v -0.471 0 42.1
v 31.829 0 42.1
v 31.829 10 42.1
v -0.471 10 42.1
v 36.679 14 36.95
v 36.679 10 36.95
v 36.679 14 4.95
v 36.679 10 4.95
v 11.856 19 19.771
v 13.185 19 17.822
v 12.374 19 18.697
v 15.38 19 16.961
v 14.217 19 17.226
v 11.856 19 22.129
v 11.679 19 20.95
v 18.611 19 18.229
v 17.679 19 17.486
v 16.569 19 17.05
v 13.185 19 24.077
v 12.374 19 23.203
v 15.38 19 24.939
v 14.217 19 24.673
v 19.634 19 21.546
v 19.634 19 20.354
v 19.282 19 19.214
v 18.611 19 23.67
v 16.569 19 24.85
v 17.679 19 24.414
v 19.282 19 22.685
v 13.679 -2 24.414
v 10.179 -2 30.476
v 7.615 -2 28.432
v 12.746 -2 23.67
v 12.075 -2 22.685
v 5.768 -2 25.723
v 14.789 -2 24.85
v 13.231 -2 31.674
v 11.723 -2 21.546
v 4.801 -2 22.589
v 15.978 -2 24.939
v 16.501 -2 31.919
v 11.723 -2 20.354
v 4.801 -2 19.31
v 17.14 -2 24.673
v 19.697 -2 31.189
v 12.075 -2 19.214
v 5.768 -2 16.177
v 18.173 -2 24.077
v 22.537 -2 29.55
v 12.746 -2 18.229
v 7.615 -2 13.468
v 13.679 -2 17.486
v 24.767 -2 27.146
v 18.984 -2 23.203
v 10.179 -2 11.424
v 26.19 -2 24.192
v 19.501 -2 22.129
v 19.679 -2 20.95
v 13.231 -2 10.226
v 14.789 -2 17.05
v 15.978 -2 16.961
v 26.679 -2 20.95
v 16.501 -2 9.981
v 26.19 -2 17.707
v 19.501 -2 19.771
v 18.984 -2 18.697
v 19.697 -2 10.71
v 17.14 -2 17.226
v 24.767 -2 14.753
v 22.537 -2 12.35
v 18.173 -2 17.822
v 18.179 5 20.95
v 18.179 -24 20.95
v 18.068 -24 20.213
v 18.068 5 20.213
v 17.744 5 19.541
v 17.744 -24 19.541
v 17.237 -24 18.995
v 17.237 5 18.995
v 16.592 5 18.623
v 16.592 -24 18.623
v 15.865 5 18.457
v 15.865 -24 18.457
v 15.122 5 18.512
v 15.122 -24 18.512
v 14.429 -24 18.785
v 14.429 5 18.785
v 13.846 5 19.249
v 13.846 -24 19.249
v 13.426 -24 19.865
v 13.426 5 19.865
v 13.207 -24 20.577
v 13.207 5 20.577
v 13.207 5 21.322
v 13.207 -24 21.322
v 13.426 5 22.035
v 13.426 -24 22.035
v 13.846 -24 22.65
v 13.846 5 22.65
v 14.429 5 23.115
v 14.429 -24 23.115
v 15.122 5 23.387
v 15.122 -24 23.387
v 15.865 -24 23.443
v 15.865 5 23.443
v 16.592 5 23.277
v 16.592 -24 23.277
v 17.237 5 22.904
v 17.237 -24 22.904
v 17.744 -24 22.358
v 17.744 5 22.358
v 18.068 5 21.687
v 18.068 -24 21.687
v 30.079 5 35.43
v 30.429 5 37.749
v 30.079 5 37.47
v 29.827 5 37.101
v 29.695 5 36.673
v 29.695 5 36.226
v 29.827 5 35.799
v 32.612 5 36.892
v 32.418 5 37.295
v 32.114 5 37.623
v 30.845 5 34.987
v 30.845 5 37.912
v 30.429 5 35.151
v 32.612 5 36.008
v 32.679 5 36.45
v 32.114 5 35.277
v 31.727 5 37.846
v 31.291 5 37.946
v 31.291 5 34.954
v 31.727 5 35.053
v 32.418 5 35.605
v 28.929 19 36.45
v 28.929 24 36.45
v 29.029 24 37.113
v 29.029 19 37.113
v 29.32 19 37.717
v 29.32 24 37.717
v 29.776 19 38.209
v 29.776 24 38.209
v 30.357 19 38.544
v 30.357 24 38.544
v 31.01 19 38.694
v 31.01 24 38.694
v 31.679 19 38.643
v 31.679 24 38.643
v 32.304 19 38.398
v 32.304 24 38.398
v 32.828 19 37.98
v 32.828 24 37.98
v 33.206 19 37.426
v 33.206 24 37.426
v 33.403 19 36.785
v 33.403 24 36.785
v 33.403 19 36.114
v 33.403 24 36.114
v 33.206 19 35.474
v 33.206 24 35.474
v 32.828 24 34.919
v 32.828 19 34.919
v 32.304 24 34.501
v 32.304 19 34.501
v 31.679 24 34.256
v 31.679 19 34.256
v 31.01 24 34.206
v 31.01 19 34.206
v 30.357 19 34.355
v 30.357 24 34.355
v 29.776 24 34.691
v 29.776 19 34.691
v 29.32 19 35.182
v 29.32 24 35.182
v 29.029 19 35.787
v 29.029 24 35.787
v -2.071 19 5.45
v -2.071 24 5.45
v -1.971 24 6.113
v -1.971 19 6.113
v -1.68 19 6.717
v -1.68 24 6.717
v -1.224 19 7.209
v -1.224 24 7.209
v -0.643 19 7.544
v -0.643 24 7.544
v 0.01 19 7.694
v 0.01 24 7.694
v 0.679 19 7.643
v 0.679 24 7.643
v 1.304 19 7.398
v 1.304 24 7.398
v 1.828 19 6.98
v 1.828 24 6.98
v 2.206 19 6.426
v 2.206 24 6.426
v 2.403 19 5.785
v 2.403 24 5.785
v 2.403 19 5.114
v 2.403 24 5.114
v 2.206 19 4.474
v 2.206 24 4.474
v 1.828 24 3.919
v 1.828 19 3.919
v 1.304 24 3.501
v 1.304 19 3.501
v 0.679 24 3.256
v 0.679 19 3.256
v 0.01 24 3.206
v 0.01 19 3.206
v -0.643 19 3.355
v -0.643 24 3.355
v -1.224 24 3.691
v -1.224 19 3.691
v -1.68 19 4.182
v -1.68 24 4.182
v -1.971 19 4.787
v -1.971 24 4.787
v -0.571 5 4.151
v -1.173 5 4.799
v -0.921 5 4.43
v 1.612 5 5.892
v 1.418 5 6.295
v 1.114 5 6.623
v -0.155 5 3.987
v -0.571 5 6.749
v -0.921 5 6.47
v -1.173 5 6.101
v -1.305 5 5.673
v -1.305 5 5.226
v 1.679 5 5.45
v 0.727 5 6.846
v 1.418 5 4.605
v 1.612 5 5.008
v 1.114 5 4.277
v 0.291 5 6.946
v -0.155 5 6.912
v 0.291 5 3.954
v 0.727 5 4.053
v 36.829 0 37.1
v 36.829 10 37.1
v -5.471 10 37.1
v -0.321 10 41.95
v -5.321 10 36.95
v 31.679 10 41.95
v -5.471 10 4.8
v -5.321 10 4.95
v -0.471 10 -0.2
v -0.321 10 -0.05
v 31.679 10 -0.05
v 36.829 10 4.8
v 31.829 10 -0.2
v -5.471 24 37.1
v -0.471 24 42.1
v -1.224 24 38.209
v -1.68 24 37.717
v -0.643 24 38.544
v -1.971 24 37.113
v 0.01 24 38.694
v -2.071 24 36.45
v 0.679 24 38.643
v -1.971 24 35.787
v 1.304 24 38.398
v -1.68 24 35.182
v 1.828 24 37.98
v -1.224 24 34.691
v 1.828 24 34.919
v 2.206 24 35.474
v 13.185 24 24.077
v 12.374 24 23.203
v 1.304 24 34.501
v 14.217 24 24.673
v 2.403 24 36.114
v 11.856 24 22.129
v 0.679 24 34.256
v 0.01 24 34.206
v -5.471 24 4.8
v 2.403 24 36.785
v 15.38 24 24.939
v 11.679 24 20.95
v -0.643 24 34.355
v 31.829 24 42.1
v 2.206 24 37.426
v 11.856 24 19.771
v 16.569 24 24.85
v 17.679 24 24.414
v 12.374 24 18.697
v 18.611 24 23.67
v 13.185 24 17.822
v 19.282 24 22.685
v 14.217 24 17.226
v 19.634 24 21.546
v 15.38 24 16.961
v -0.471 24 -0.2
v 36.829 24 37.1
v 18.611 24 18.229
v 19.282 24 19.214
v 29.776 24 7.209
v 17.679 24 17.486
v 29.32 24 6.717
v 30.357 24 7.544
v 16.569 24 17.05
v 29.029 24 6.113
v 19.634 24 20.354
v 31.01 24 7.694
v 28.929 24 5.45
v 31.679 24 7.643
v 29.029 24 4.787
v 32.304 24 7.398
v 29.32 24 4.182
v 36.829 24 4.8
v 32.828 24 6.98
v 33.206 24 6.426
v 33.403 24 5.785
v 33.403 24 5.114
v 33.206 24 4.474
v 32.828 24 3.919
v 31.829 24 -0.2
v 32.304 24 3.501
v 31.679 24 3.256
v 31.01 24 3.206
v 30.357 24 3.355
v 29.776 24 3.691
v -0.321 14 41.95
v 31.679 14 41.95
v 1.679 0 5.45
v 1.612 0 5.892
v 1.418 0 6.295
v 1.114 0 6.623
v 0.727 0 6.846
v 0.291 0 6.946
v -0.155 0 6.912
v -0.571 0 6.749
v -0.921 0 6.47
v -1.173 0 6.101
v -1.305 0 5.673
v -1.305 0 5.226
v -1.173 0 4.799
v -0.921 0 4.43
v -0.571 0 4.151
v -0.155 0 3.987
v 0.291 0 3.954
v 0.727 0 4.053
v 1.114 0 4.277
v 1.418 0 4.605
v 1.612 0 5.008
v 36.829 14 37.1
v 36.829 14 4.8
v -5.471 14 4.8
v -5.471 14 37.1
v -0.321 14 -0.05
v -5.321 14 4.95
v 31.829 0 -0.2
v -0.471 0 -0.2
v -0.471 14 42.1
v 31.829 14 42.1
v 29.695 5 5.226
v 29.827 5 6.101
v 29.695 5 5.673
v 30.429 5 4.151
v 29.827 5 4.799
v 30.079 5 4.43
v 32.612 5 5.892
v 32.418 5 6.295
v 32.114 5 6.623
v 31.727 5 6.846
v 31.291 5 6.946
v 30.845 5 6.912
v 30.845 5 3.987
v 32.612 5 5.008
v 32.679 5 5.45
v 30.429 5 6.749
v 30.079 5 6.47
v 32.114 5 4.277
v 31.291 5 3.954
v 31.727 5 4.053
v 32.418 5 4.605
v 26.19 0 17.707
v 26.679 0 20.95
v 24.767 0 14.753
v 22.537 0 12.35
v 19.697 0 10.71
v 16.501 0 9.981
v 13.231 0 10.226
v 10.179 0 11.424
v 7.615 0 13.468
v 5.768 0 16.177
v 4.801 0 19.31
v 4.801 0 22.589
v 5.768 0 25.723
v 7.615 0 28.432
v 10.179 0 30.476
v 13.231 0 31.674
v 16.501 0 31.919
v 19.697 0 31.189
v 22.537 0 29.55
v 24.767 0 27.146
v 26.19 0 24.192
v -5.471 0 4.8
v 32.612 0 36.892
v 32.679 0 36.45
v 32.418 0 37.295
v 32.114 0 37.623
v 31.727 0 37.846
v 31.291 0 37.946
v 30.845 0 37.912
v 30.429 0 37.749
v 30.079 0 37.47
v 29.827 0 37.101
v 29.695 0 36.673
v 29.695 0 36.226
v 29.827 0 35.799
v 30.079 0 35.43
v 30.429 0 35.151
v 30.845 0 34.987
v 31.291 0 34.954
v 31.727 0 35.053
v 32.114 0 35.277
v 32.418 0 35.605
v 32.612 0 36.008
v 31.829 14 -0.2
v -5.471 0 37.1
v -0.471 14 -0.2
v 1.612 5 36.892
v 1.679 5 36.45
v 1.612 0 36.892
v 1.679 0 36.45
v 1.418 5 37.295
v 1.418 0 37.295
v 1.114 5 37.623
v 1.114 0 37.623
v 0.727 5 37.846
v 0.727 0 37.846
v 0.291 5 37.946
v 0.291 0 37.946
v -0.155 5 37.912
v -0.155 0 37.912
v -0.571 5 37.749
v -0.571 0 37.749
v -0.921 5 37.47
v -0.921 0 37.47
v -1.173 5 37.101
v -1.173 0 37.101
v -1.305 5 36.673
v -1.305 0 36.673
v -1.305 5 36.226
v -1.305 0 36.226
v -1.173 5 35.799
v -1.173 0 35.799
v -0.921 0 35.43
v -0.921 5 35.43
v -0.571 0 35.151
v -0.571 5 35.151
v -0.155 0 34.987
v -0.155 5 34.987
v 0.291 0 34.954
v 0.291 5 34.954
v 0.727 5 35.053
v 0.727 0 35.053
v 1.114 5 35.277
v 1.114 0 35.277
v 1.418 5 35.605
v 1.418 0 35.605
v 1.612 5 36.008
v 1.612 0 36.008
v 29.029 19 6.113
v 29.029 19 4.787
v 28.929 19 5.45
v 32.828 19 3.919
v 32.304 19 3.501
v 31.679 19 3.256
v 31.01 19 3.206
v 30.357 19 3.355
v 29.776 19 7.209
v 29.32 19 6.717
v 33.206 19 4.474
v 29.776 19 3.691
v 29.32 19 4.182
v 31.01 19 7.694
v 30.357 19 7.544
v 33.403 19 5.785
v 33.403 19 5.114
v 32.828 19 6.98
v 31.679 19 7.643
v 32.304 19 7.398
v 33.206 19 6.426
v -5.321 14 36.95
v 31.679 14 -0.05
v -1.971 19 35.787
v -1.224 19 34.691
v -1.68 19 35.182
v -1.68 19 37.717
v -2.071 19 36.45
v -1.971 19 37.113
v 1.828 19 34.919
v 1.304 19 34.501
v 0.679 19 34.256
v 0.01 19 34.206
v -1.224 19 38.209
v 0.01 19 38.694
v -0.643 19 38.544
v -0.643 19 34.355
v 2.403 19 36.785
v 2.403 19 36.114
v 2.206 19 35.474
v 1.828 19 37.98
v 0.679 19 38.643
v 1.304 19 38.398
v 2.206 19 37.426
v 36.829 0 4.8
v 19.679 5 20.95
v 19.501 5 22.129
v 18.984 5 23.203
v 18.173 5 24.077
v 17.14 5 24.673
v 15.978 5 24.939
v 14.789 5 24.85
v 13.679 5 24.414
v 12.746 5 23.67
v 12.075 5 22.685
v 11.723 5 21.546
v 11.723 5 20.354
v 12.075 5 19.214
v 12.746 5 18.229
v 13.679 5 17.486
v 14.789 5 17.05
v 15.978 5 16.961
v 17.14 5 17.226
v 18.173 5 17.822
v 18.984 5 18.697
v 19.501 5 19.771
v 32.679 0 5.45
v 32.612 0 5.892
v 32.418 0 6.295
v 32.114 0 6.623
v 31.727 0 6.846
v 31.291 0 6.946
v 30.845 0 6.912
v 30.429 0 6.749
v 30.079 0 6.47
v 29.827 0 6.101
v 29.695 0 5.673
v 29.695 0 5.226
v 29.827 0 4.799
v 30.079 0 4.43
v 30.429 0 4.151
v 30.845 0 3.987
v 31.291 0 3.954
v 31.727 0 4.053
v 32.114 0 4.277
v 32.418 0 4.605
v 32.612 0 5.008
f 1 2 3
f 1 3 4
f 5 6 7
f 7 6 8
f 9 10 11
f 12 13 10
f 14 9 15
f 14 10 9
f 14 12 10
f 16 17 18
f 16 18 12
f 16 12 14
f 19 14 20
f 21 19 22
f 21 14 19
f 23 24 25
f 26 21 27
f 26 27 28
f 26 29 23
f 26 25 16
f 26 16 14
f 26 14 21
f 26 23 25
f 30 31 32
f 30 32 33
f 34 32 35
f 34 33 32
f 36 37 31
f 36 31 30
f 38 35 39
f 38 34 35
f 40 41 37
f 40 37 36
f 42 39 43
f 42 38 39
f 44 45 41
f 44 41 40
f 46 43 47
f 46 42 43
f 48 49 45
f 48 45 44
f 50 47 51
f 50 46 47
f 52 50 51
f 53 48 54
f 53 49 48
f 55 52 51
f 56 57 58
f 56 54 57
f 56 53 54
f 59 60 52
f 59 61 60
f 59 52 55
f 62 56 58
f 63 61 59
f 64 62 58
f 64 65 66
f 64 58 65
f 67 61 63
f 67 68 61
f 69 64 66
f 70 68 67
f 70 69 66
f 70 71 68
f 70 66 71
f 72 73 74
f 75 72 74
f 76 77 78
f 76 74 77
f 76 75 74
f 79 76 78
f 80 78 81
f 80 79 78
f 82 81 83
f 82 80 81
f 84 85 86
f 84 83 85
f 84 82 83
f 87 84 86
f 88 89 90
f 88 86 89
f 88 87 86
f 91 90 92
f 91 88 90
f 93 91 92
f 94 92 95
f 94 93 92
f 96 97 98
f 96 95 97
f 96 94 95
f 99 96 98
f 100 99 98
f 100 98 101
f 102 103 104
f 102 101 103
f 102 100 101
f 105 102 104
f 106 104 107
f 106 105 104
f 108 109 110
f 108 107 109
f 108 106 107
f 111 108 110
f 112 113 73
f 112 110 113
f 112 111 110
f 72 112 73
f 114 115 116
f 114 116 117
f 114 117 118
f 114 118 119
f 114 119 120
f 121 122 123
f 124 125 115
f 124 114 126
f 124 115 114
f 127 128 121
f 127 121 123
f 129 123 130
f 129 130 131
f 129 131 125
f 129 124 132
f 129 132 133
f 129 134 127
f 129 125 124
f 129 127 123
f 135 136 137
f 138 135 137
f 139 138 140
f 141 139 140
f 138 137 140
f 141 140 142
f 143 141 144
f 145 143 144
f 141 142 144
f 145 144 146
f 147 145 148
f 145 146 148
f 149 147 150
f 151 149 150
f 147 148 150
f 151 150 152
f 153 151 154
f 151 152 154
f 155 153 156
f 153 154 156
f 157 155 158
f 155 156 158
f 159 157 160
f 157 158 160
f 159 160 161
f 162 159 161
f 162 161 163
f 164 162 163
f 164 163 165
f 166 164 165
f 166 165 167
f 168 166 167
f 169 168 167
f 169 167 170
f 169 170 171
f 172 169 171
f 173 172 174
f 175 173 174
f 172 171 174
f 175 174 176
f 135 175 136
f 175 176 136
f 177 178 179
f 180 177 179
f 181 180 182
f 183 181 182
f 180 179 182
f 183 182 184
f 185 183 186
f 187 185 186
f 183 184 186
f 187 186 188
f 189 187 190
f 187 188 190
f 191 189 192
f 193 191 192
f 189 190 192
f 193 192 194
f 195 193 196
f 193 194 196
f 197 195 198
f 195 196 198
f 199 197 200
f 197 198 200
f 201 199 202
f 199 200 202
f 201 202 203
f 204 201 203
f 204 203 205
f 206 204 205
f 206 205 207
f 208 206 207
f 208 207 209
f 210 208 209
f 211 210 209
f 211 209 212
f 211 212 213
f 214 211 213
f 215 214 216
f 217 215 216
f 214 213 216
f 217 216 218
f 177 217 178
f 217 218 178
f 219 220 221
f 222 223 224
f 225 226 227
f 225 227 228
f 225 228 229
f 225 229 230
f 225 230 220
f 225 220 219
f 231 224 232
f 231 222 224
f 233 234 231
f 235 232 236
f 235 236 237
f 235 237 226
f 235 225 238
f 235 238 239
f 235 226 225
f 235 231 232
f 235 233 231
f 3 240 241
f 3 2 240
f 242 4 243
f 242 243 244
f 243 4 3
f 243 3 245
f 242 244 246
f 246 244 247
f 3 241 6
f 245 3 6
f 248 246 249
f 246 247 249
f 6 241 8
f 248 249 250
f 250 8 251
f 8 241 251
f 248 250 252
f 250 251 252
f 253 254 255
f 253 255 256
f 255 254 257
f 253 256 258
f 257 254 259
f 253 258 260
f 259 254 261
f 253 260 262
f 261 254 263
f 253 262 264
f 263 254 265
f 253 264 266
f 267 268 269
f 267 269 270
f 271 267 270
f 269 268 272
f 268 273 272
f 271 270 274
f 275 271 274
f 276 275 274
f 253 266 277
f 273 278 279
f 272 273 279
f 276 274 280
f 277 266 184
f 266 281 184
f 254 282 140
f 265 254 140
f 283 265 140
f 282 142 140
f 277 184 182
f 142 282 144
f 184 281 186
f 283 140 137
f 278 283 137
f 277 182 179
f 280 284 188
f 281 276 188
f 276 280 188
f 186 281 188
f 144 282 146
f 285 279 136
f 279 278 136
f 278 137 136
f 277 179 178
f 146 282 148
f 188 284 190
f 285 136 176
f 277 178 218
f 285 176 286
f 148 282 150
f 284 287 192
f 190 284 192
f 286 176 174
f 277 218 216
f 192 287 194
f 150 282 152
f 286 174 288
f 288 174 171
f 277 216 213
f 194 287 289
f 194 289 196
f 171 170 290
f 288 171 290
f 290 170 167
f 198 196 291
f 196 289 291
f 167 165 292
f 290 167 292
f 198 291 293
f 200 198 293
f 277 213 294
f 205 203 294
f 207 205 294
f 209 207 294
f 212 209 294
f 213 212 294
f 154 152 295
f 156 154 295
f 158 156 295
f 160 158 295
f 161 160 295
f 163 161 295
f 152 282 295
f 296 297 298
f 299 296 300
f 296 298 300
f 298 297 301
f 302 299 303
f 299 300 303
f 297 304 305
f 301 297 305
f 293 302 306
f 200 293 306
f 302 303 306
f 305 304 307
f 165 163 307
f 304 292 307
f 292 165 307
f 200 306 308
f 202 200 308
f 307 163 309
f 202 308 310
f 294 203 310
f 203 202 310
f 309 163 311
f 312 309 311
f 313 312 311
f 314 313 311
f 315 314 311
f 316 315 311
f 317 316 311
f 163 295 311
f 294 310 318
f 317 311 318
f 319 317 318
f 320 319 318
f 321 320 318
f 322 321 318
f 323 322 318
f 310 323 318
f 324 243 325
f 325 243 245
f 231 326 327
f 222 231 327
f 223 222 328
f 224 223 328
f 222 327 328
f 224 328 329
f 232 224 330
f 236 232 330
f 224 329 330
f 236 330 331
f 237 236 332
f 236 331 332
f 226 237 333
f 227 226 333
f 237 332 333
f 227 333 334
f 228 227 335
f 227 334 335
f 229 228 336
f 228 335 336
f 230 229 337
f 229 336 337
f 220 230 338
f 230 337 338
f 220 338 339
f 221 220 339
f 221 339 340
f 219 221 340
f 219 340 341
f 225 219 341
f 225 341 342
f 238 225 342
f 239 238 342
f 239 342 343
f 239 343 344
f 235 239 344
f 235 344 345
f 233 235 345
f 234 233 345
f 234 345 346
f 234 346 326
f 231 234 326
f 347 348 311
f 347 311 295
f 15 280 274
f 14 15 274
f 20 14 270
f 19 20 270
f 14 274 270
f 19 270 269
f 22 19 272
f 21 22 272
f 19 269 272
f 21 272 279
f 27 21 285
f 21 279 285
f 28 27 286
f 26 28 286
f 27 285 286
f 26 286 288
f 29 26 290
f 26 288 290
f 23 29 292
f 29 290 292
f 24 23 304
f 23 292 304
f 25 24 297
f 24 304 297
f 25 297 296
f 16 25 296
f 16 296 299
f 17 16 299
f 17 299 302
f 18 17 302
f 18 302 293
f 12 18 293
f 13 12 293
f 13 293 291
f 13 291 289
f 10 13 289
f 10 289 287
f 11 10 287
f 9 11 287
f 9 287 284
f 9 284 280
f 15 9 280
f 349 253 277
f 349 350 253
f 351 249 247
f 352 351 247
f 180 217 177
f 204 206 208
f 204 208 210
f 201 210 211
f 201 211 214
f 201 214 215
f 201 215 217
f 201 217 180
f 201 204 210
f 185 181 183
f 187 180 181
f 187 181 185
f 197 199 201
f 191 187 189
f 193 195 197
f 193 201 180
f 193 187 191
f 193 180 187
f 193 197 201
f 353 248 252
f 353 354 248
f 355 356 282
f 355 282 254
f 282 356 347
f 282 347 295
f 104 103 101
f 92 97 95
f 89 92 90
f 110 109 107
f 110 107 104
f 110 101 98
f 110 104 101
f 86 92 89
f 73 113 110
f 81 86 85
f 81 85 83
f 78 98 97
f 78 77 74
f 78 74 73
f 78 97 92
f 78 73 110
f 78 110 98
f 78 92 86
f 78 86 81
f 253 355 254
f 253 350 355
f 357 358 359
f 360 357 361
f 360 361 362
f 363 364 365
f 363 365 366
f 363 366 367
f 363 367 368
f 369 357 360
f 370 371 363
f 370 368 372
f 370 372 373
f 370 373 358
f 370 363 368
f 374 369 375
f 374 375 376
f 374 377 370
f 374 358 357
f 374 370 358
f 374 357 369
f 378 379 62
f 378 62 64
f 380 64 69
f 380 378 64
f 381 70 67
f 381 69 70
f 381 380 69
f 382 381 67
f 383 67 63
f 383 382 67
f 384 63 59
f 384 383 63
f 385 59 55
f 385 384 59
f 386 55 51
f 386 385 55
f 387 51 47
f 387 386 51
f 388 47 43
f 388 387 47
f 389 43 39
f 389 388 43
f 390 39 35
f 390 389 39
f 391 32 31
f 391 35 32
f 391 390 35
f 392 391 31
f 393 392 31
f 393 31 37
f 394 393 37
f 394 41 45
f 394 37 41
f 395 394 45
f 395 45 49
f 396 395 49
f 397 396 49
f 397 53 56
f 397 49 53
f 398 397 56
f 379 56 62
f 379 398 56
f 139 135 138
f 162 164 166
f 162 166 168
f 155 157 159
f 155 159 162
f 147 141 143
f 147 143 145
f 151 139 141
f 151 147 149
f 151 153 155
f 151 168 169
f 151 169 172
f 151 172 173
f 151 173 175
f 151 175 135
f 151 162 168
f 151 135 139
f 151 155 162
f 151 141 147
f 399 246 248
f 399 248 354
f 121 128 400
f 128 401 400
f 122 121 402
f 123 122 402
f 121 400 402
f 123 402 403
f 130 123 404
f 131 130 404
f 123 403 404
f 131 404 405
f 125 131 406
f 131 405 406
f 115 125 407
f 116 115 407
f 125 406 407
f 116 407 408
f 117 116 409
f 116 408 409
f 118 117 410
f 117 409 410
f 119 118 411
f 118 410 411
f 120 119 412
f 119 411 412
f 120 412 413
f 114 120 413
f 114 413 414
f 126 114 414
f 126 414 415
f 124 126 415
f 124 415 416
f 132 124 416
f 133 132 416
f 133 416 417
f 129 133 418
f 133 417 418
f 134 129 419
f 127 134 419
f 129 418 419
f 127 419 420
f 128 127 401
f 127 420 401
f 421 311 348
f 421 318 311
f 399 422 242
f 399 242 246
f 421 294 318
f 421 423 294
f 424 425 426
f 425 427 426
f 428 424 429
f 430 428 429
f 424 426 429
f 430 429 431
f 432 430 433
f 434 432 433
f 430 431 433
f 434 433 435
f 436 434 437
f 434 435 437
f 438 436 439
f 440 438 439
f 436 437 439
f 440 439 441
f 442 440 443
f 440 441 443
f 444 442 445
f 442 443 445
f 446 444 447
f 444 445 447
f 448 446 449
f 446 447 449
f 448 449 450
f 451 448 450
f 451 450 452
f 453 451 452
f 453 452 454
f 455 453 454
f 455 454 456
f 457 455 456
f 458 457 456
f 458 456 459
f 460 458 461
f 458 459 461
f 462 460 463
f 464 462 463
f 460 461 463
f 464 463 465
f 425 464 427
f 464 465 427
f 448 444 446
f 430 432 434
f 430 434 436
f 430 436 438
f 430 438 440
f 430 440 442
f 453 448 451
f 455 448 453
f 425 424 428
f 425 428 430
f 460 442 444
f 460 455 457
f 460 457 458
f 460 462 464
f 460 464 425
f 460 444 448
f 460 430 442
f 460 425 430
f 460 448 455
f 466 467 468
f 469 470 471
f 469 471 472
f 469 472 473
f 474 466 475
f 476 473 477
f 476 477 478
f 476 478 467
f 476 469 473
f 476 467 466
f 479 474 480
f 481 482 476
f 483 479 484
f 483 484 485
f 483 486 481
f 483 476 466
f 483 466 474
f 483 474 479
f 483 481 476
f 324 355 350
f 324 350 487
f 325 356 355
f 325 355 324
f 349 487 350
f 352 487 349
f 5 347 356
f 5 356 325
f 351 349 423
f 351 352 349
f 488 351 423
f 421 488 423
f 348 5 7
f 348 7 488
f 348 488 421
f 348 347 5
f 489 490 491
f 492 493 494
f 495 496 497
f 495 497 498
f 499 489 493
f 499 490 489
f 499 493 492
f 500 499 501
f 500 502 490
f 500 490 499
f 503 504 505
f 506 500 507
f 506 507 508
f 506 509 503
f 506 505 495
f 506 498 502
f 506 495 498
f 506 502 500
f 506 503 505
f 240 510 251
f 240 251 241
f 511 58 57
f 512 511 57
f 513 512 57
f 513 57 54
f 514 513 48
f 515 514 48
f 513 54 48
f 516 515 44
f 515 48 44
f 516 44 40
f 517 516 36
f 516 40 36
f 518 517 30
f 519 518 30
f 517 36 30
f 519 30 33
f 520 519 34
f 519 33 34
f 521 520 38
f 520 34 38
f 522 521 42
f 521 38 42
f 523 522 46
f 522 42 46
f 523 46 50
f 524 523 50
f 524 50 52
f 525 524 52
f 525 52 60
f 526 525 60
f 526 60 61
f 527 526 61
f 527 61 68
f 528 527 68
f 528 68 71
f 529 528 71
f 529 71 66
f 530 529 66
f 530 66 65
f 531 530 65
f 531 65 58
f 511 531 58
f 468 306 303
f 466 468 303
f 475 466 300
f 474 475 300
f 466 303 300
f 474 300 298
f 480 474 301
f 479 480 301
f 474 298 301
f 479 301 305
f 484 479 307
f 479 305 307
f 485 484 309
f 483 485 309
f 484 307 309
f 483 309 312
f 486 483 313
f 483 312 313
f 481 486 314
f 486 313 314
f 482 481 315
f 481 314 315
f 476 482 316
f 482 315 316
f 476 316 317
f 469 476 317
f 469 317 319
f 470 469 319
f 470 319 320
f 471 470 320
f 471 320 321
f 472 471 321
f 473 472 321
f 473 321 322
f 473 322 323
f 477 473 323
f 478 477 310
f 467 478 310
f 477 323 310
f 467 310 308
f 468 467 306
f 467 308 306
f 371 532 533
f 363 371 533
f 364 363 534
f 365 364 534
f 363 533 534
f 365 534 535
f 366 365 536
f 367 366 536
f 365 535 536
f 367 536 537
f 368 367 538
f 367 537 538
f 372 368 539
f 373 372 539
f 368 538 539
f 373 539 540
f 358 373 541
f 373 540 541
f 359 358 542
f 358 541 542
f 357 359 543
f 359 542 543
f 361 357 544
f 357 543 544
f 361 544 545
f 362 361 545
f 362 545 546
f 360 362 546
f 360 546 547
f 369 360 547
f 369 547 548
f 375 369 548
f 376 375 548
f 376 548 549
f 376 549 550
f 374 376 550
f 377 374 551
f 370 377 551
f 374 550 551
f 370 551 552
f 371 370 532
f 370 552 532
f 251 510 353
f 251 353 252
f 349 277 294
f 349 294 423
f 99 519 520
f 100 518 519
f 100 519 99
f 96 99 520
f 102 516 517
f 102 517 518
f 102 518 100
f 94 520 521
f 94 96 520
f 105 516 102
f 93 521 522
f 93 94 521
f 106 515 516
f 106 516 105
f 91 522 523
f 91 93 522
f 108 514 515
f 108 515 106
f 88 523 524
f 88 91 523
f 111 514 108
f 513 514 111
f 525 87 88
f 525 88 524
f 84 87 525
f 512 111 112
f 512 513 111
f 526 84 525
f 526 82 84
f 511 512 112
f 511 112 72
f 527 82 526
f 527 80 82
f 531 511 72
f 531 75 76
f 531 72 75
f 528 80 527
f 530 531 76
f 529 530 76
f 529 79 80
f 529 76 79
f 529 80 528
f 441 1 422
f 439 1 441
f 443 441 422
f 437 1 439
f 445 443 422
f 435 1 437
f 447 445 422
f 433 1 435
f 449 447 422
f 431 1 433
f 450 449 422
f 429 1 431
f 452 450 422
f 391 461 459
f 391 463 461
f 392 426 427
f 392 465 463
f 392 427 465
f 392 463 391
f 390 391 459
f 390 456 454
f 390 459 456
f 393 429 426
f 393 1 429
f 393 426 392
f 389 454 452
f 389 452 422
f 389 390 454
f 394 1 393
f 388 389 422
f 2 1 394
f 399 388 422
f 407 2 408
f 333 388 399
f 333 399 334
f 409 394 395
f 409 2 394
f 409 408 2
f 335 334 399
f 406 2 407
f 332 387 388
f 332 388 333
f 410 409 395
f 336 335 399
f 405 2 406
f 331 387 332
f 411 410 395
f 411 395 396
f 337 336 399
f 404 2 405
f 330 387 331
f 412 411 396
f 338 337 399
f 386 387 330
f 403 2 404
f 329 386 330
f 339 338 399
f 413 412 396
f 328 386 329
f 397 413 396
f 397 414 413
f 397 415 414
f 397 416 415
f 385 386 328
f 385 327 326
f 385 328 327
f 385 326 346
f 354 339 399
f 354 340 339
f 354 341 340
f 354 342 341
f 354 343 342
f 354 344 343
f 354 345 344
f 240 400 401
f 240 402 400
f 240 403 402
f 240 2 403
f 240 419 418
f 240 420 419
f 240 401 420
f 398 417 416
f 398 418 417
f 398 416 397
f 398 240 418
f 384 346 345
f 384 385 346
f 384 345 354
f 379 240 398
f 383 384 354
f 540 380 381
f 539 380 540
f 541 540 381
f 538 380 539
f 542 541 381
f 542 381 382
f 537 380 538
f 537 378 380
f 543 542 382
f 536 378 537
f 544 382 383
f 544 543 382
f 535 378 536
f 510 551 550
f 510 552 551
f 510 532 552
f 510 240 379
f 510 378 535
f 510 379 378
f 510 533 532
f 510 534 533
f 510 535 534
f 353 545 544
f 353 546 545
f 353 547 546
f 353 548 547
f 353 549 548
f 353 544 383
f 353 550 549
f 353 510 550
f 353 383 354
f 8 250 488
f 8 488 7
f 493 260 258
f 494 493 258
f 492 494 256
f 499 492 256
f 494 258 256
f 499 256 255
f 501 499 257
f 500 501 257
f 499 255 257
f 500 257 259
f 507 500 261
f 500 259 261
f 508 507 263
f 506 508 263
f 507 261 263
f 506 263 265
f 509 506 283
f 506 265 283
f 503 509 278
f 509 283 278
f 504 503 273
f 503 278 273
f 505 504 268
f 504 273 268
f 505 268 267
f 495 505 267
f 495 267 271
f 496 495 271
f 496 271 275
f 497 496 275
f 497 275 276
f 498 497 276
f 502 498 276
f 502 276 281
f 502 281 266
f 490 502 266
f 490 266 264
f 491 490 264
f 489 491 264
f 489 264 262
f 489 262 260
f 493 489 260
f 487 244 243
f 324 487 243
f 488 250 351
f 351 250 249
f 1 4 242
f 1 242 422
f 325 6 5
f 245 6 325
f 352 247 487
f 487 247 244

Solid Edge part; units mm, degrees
sketch "Sketch1" plane through (0, 0, 0) normal (0, -1, 0) x (1, 0, 0)
  line L0 (-5.4714, -0.2002) -> (36.8286, -0.2002)
  line L1 (36.8286, -0.2002) -> (36.8286, 42.0998)
  line L2 (36.8286, 42.0998) -> (-5.4714, 42.0998)
  line L3 (-5.4714, 42.0998) -> (-5.4714, -0.2002)
extrude "Protrusion1" add sketch "Sketch1" against normal blind 10
sketch "Sketch2" plane through (15.6786, 0, 20.9498) normal (0, -1, 0) x (1, 0, 0)
  circle A0 centre (0, 0) radius 11
extrude "ProtrusiónExtruida_2" add sketch "Sketch2" along normal blind 2
chamfer "Chaflán_2" distance 5 angle 45 4 edges at (36.8286, 5, 42.0998) (36.8286, 5, -0.2002) (-5.4714, 5, -0.2002) (-5.4714, 5, 42.0998)
sketch "Sketch3" plane through (15.6786, -2, 20.9498) normal (0, -1, 0) x (1, 0, 0)
  circle A0 centre (0, 0) radius 4
  circle A1 centre (15.5, 15.5) radius 1.5
  circle A2 centre (-15.5, 15.5) radius 1.5
  circle A3 centre (-15.5, -15.5) radius 1.5
  circle A4 centre (15.5, -15.5) radius 1.5
extrude "VaciadoExtruido_2" cut sketch "Sketch3" against normal blind 7
sketch "Sketch4" plane through (15.6786, 5, 20.9498) normal (0, -1, 0) x (1, 0, 0)
  circle A0 centre (0, 0) radius 2.5
extrude "ProtrusiónExtruida_3" add sketch "Sketch4" along normal blind 29
sketch "Sketch5" plane through (15.6786, 10, 20.9498) normal (0, 1, 0) x (0, 0, -1)
  line L0 (-21, -21) -> (21, -21)
  line L1 (21, -21) -> (21, 21)
  line L2 (21, 21) -> (-21, 21)
  line L3 (-21, 21) -> (-21, -21)
extrude "ProtrusiónExtruida_4" add sketch "Sketch5" along normal blind 4
chamfer "Chaflán_9" distance 5 angle 45 4 edges at (-5.3214, 12, 41.9498) (36.6786, 12, 41.9498) (36.6786, 12, -0.0502) (-5.3214, 12, -0.0502)
sketch "Sketch6" plane through (15.6786, 14, 20.9498) normal (0, 1, 0) x (0, 0, -1)
  line L0 (21.15, -21.15) -> (-21.15, -21.15)
  line L1 (-21.15, -21.15) -> (-21.15, 21.15)
  line L2 (-21.15, 21.15) -> (21.15, 21.15)
  line L3 (21.15, 21.15) -> (21.15, -21.15)
extrude "ProtrusiónExtruida_5" add sketch "Sketch6" along normal blind 10
chamfer "Chaflán_10" distance 5 angle 45 4 edges at (36.8286, 19, 42.0998) (-5.4714, 19, 42.0998) (-5.4714, 19, -0.2002) (36.8286, 19, -0.2002)
sketch "Sketch7" plane through (15.6786, 24, 20.9498) normal (0, 1, 0) x (-1, 0, 0)
  circle A0 centre (0, 0) radius 4
  circle A1 centre (-15.5, 15.5) radius 2.25
  circle A2 centre (15.5, 15.5) radius 2.25
  circle A3 centre (15.5, -15.5) radius 2.25
  circle A4 centre (-15.5, -15.5) radius 2.25
extrude "VaciadoExtruido_3" cut sketch "Sketch7" against normal blind 5
